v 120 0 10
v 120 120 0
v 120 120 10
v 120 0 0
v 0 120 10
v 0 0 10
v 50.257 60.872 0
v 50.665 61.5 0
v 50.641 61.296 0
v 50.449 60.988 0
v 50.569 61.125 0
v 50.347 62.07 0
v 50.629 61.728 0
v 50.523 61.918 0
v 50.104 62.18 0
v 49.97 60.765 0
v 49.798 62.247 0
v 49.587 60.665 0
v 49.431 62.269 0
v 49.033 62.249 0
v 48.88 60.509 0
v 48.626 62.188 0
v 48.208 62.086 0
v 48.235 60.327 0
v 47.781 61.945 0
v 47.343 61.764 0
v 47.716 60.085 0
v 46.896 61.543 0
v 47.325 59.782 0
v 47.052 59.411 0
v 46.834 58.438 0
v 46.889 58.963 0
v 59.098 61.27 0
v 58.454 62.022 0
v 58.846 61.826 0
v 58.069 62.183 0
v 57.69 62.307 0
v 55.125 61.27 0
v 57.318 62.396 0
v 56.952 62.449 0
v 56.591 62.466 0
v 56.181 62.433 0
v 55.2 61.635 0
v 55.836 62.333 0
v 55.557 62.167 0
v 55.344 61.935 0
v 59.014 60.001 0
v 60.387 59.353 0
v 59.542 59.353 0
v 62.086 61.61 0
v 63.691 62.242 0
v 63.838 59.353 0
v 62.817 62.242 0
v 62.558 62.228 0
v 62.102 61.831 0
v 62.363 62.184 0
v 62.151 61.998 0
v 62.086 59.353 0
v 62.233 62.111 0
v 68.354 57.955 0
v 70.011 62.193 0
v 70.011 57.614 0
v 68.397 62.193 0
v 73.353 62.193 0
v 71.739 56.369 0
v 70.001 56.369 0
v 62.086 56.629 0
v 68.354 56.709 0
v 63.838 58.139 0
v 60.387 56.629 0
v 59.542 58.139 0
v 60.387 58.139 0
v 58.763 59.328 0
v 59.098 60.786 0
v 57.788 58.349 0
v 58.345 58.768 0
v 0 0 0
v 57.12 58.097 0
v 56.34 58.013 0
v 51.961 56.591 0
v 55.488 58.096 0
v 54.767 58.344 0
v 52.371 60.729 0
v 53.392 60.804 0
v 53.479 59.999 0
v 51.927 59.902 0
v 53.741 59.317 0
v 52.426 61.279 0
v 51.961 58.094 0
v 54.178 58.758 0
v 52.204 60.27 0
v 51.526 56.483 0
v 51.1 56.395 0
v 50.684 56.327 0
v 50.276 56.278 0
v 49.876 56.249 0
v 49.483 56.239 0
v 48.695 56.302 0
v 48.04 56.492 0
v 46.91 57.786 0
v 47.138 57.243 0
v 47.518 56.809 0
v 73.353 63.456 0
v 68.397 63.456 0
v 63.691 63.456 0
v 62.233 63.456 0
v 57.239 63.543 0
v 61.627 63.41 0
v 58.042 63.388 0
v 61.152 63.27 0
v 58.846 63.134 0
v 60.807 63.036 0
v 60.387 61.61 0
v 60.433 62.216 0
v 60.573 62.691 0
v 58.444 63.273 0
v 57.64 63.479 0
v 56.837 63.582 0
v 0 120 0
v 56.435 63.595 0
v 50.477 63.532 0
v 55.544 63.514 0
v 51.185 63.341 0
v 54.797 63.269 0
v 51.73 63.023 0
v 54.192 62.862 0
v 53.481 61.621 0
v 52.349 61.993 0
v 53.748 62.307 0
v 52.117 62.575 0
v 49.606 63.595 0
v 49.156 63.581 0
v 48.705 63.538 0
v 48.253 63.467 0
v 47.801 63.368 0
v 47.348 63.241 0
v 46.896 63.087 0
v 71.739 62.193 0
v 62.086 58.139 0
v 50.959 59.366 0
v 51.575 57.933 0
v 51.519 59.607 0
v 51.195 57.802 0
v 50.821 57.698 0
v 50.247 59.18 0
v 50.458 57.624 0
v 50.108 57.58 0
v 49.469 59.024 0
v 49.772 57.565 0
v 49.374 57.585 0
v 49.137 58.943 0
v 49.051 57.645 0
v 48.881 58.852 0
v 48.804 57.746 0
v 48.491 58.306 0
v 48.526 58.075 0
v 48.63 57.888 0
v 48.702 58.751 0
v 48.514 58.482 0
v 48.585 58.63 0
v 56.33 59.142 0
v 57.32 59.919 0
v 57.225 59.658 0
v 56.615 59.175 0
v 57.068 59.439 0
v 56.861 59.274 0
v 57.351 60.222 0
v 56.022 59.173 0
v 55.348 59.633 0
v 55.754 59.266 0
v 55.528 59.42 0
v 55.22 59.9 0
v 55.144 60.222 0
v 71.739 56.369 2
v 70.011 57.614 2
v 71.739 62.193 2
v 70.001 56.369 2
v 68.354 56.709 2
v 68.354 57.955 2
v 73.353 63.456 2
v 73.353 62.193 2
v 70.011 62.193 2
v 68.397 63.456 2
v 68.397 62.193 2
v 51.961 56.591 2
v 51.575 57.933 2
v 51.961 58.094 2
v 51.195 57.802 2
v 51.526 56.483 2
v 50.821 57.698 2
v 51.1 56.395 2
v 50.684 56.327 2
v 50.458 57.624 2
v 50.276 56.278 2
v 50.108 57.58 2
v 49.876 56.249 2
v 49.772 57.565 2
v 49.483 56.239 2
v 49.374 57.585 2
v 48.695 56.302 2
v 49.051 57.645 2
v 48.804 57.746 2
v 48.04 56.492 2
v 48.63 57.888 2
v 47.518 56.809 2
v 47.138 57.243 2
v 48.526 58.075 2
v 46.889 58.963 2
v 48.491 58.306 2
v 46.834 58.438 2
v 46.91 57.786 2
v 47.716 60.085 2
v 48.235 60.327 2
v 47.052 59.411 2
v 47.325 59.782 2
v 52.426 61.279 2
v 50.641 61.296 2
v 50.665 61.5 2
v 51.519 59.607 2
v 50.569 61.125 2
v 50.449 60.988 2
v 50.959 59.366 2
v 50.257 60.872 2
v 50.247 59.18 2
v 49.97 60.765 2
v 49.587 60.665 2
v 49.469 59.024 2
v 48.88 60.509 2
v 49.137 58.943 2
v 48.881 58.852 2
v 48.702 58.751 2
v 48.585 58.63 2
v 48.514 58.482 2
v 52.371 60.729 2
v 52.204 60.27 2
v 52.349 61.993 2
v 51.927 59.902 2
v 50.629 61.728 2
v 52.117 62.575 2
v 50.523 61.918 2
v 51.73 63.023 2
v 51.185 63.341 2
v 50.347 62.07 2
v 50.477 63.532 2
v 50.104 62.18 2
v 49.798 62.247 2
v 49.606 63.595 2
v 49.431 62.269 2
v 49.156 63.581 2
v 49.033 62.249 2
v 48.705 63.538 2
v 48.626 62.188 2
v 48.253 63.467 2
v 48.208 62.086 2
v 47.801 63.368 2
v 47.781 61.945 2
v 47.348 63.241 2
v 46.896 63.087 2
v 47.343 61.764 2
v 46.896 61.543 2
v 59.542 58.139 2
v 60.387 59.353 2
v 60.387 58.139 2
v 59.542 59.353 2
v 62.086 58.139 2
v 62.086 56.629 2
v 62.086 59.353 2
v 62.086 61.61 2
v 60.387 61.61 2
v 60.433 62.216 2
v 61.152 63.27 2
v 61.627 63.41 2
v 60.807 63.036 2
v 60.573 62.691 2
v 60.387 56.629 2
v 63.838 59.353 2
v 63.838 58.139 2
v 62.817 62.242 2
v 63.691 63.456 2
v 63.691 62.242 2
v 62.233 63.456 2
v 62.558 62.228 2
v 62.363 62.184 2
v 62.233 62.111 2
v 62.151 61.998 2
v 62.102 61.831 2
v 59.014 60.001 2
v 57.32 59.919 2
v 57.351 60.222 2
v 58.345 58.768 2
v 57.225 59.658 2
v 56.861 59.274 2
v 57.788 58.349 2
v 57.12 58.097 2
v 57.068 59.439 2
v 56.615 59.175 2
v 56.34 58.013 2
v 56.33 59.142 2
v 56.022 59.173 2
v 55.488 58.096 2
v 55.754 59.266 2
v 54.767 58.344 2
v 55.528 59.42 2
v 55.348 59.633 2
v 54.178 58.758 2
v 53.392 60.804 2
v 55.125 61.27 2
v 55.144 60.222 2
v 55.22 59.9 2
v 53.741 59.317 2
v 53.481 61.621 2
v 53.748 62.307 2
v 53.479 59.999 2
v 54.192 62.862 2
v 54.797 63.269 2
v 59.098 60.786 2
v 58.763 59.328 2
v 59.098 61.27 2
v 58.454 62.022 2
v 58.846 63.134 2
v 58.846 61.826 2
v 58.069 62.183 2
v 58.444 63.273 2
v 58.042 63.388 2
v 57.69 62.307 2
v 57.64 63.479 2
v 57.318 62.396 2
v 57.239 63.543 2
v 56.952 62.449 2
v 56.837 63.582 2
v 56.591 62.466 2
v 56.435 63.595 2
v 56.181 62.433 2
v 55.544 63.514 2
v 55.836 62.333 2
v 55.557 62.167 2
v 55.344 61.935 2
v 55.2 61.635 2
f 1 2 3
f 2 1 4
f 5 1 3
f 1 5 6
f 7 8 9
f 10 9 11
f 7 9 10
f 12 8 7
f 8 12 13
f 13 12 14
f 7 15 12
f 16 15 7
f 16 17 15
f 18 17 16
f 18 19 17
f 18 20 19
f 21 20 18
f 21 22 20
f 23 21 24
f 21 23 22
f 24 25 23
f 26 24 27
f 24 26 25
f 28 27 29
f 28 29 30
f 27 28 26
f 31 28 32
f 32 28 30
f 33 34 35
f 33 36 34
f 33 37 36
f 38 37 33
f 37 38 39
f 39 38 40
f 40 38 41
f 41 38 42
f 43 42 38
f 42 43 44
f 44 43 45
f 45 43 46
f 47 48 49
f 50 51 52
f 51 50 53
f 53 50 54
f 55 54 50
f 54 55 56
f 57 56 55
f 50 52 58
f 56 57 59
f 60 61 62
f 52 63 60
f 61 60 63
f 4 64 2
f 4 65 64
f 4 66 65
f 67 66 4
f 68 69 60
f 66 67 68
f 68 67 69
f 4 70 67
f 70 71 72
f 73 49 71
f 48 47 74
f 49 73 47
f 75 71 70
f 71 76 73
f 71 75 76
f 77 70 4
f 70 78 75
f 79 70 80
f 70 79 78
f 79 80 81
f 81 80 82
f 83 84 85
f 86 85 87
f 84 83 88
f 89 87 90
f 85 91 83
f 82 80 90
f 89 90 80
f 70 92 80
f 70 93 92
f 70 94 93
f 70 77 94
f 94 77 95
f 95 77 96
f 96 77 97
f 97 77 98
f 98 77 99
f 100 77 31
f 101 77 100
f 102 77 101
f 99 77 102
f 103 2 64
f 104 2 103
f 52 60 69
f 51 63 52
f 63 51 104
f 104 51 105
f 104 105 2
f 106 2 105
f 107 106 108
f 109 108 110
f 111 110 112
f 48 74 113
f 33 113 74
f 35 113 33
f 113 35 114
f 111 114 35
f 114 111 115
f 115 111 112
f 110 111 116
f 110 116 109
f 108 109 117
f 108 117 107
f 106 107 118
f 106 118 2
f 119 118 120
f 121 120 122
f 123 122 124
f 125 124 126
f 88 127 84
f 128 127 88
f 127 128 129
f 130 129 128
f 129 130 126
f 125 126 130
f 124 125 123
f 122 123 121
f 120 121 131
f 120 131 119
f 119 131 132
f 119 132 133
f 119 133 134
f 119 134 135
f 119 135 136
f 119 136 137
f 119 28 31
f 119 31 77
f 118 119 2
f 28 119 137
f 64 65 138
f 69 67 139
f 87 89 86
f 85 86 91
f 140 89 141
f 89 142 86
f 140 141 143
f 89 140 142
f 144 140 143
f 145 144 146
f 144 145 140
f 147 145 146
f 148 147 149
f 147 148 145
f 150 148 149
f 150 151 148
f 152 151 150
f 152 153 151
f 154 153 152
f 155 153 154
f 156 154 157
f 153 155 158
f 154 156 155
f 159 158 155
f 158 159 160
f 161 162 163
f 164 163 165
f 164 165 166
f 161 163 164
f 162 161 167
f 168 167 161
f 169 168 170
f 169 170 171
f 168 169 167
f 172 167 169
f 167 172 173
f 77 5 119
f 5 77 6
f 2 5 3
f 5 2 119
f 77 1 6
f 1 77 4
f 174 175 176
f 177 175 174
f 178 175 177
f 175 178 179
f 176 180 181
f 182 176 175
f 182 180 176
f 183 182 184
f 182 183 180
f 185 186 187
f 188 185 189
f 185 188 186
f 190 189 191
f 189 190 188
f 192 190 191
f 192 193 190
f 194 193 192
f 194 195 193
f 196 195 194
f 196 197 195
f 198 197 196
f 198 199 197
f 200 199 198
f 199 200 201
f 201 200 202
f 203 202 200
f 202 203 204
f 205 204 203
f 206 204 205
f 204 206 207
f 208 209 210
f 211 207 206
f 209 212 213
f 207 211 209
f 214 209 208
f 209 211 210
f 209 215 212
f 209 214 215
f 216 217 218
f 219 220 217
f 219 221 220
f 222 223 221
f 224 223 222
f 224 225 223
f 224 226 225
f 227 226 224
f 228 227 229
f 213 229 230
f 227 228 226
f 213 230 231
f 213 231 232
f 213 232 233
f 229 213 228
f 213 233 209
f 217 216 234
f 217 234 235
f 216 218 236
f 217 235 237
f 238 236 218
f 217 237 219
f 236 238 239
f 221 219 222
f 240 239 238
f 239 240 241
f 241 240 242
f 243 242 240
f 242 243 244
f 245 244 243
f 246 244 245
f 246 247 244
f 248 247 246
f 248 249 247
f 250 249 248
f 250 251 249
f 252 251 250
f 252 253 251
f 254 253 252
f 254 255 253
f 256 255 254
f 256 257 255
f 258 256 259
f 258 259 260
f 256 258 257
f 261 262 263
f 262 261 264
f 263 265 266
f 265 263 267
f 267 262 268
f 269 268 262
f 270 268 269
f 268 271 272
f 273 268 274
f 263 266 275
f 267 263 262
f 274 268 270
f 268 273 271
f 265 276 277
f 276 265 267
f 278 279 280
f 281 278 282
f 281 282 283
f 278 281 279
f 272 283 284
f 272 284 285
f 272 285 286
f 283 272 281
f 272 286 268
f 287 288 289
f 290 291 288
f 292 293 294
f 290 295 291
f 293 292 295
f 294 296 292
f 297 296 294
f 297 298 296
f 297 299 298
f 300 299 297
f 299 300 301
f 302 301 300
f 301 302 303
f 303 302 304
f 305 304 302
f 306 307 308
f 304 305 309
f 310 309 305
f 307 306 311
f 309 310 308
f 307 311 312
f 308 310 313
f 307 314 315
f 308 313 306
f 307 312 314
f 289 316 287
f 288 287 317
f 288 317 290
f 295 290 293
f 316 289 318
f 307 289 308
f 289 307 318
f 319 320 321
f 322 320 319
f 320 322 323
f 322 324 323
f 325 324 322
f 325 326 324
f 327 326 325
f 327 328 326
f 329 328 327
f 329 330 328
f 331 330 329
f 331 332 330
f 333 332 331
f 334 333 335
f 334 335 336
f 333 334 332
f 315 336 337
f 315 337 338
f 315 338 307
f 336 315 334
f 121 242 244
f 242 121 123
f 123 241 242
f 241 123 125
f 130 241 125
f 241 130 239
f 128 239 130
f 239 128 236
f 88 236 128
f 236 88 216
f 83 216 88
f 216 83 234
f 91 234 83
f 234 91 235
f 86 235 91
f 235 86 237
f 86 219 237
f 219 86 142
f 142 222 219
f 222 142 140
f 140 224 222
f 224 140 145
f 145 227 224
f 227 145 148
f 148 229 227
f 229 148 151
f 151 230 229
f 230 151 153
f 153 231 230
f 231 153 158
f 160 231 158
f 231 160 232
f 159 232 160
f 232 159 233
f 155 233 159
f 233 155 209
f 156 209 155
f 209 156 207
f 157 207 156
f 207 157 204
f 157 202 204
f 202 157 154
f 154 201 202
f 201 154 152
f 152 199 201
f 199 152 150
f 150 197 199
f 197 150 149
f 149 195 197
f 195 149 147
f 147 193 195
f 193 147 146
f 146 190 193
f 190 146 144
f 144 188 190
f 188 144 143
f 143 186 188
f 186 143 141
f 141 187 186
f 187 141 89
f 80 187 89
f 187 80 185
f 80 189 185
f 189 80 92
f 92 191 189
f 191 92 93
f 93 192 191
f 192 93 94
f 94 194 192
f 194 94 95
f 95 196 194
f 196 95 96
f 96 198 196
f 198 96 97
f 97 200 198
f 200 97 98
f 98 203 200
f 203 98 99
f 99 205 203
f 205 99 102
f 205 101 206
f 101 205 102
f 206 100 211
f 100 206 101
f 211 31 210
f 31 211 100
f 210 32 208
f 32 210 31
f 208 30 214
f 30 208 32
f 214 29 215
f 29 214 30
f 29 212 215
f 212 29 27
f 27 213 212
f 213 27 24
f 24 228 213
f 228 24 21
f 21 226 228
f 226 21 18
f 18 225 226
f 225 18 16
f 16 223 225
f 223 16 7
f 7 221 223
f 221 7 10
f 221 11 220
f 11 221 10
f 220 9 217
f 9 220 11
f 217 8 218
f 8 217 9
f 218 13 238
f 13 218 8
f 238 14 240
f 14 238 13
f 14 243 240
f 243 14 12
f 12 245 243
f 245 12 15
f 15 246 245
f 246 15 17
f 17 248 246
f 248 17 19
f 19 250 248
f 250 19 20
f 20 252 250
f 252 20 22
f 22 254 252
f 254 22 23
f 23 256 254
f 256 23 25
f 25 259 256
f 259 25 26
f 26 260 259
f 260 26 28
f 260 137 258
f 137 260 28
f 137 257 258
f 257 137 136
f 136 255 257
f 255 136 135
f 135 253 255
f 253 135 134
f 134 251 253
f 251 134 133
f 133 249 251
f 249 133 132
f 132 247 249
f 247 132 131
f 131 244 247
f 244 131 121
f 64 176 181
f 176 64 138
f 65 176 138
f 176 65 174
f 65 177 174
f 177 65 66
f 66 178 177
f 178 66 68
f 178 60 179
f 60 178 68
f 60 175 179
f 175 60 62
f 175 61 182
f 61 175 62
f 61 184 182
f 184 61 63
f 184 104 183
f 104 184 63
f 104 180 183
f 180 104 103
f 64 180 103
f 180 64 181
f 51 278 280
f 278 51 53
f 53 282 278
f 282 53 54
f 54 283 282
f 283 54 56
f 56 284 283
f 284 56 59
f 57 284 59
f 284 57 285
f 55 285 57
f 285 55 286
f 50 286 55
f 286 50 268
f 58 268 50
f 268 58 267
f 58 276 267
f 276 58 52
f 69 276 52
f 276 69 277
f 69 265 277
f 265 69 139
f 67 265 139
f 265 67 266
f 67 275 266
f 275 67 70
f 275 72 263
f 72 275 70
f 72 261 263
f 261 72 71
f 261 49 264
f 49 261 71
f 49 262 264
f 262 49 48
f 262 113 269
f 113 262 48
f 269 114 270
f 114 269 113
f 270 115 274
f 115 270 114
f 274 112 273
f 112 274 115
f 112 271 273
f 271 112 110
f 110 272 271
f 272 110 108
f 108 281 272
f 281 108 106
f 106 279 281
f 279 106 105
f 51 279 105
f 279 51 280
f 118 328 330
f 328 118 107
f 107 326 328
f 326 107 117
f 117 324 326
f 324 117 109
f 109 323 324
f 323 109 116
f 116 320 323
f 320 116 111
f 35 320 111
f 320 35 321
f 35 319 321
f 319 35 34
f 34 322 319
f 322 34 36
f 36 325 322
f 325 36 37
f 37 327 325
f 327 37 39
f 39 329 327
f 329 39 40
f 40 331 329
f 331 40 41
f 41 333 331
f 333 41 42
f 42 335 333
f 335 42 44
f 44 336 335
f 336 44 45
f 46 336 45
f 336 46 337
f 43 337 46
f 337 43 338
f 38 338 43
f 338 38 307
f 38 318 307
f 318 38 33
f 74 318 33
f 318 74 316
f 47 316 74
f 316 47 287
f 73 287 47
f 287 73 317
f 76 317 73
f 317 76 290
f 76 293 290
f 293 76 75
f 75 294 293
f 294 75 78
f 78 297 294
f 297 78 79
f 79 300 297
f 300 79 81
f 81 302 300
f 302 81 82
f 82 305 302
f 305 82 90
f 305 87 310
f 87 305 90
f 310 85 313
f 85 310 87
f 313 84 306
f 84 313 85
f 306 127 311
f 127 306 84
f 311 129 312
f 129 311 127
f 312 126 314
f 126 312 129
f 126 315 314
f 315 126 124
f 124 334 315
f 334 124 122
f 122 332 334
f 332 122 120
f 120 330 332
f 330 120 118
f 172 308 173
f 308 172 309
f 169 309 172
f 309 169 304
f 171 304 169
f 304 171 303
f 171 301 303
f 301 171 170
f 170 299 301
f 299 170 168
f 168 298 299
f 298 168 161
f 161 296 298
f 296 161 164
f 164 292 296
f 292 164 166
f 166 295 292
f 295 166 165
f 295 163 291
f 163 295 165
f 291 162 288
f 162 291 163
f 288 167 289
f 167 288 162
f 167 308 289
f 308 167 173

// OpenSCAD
// These are filled in by R
code = "Set 1";

// An array of 10 length-10 vectors.
bar_size_array = [
[17.2132916532488,36.0726778298176,54.2805262628744,44.4444444444444,61.9245526818619,50.7074818380197,56.25,40.0785338307062,22.0127311987223,22.4791120091637],
[38.8888888888889,36.5326685973083,60.6048197004773,79.1733622802731,57.8561014062212,63.6954720806375,73.9009126352287,69.5058337232162,50,35.883306175941],
[38.1227054057077,50,71.5781966823856,78.0387893728885,73.0247641215147,79.3457321581292,76.4487140449692,60.2850865121486,73.6180225635272,51.6168085569634],
[51.6338022642176,50,72.1359195374152,77.8564545475736,77.6548459734233,83.6727355531855,80.1118734750418,78.0822829776518,58.8090469659699,60.4772399602897],
[53.1909972031816,73.6119311325102,78.7898152265196,93.0707104707105,75,91.2860602492667,88.7231732538991,82.430390424427,82.7221844761274,56.7836807418812],
[50,70.4978204440376,82.9419683036247,77.3135338983101,93.5021713686879,92.7988617990163,92.2702618237552,84.4433450329672,62.5809750772325,67.5406969859362],
[50,54.04074810748,78.3429021915171,90,78.8655086916362,84.8496818563354,71.3615695358822,63.9732487434342,72.2713392999096,54.210772462078],
[53.156399060411,60.0248403434983,64.2857142857143,76.0232773758408,74.3494959853926,79.3062840090834,88.5882590982453,73.3749200518473,69.2533076489751,50],
[33.3333333333333,53.0511631182311,55.6600056166252,75.9804710617615,67.0628823114062,75.9764709211653,65.6082979786601,50,48.7851150015597,27.7777777777778],
[18.8303895035829,50,52.7256323320697,50,62.759087567418,48.0849922621125,50,32.1382652843772,29.8500876249718,12.1695641200453]
];


letter_array = [
["","","","H","","","m","","",""],
["G","","","","","","","","M",""],
["","h","","","","","","","",""],
["","Y","","","","","","","",""],
["","","","","y","","","","",""],
["g","","","","","","","","",""],
["a","","","A","","","","","",""],
["","","q","","","","","","","f"],
["r","","","","","","","F","","d"],
["","Q","","R","","","D","","",""]
];

x_axis_label = "Factor 1";
y_axis_label = "Factor 2";

bar_dims_xy=[10,10]; // in mm
n_bars_xy=[10,10];
plot_margins_xy=[[10,10],[10,10]]; // in mm

base_color = [0, 0, 0]; // black
label_color = [1, 1, 1]; // white
bar_color = [.5, .5, .5]; // grey

//---------------------------------------------------------------------

// Cumulative sum function
// https://en.wikibooks.org/wiki/OpenSCAD_User_Manual/Tips_and_Tricks#Cumulative_sum
function cumsum(values) = ([ for (a=0, b=values[0]; a < len(values); a= a+1, b=b+(values[a]==undef?0:values[a])) b] );

// Add vector values
// https://en.wikibooks.org/wiki/OpenSCAD_User_Manual/Tips_and_Tricks#Add_all_values_in_a_list
function add(v, i = 0, r = 0) = i < len(v) ? add(v, i + 1, r + v[i]) : r;

// Add vectors
// https://forum.openscad.org/adding-vectors-function-td14524.html
function addvec(v, av) = (len(v) == len(av)) ? [ for (i = [ 0 : len(v)-1 ]) v[i] + av[i] ] : [0,0,0];

// Letter extrusion code
// https://files.openscad.org/examples/Basics/text_on_cube.html
font = "Atkinson Hyperlegible Next:style=Bold";

module letter(l, size=letter_size, height=letter_height) {
	// Use linear_extrude() to make the letters 3D objects as they
	// are only 2D shapes when only using text()
    if(1!="") {
        linear_extrude(height = height) {
            text(l, size = size, font = font, halign = "center", valign = "center", $fn = 16);
        }
    }
}

letter_size = 5; // 5mm
letter_height = 2; // 2mm

//---------------------------------------------------------------------

// These define the [x,y] dims of the bar, in mm
bar_size_x = [for(i = [0:(n_bars_xy[0]-1)]) bar_dims_xy[0]];
bar_size_y = [for(i = [0:(n_bars_xy[1]-1)]) bar_dims_xy[1]];

// These define the plot margins
margins_x = plot_margins_xy[0];
margins_y = plot_margins_xy[1];

// This calculates the base dimensions
base_x = margins_x[0] + margins_x[1] + add(bar_size_x);
base_y = margins_y[0] + margins_y[1] + add(bar_size_y);
base_z = 10;
echo("Base size", base_x, base_y, base_z);

// These define the location of the bottom of the bar
bar_x = cumsum(bar_size_x);
bar_y = cumsum(bar_size_y);
bar_z = [for(i = [0:1:9]) base_z];

// These define the location of the text on the bar (if applicable)
letter_x = addvec(bar_x, bar_size_x/2);
letter_y = addvec(bar_y, bar_size_x/2);
letter_z = [for(i=[0:(n_bars_xy[0]-1)]) addvec(bar_z, bar_size_array[i])];


render(){
    difference(){
        union(){
            // Base
            color(base_color) cube([base_x,base_y,base_z]);



            // TODO: Create this based off of groups...


            labels_x = [base_x/2, margins_x[0]/2];
            labels_y = [margins_y[0]/2, base_y/2];
            labels_z = [base_z, base_z];
            rotation = [0, 90];
            labels = [x_axis_label, y_axis_label];



        };
        // Subtract off the code
        translate([base_x/2,base_y/2,letter_height])
            rotate([180,0,0])
            color(label_color)
            letter(code, 7);
    }
}
